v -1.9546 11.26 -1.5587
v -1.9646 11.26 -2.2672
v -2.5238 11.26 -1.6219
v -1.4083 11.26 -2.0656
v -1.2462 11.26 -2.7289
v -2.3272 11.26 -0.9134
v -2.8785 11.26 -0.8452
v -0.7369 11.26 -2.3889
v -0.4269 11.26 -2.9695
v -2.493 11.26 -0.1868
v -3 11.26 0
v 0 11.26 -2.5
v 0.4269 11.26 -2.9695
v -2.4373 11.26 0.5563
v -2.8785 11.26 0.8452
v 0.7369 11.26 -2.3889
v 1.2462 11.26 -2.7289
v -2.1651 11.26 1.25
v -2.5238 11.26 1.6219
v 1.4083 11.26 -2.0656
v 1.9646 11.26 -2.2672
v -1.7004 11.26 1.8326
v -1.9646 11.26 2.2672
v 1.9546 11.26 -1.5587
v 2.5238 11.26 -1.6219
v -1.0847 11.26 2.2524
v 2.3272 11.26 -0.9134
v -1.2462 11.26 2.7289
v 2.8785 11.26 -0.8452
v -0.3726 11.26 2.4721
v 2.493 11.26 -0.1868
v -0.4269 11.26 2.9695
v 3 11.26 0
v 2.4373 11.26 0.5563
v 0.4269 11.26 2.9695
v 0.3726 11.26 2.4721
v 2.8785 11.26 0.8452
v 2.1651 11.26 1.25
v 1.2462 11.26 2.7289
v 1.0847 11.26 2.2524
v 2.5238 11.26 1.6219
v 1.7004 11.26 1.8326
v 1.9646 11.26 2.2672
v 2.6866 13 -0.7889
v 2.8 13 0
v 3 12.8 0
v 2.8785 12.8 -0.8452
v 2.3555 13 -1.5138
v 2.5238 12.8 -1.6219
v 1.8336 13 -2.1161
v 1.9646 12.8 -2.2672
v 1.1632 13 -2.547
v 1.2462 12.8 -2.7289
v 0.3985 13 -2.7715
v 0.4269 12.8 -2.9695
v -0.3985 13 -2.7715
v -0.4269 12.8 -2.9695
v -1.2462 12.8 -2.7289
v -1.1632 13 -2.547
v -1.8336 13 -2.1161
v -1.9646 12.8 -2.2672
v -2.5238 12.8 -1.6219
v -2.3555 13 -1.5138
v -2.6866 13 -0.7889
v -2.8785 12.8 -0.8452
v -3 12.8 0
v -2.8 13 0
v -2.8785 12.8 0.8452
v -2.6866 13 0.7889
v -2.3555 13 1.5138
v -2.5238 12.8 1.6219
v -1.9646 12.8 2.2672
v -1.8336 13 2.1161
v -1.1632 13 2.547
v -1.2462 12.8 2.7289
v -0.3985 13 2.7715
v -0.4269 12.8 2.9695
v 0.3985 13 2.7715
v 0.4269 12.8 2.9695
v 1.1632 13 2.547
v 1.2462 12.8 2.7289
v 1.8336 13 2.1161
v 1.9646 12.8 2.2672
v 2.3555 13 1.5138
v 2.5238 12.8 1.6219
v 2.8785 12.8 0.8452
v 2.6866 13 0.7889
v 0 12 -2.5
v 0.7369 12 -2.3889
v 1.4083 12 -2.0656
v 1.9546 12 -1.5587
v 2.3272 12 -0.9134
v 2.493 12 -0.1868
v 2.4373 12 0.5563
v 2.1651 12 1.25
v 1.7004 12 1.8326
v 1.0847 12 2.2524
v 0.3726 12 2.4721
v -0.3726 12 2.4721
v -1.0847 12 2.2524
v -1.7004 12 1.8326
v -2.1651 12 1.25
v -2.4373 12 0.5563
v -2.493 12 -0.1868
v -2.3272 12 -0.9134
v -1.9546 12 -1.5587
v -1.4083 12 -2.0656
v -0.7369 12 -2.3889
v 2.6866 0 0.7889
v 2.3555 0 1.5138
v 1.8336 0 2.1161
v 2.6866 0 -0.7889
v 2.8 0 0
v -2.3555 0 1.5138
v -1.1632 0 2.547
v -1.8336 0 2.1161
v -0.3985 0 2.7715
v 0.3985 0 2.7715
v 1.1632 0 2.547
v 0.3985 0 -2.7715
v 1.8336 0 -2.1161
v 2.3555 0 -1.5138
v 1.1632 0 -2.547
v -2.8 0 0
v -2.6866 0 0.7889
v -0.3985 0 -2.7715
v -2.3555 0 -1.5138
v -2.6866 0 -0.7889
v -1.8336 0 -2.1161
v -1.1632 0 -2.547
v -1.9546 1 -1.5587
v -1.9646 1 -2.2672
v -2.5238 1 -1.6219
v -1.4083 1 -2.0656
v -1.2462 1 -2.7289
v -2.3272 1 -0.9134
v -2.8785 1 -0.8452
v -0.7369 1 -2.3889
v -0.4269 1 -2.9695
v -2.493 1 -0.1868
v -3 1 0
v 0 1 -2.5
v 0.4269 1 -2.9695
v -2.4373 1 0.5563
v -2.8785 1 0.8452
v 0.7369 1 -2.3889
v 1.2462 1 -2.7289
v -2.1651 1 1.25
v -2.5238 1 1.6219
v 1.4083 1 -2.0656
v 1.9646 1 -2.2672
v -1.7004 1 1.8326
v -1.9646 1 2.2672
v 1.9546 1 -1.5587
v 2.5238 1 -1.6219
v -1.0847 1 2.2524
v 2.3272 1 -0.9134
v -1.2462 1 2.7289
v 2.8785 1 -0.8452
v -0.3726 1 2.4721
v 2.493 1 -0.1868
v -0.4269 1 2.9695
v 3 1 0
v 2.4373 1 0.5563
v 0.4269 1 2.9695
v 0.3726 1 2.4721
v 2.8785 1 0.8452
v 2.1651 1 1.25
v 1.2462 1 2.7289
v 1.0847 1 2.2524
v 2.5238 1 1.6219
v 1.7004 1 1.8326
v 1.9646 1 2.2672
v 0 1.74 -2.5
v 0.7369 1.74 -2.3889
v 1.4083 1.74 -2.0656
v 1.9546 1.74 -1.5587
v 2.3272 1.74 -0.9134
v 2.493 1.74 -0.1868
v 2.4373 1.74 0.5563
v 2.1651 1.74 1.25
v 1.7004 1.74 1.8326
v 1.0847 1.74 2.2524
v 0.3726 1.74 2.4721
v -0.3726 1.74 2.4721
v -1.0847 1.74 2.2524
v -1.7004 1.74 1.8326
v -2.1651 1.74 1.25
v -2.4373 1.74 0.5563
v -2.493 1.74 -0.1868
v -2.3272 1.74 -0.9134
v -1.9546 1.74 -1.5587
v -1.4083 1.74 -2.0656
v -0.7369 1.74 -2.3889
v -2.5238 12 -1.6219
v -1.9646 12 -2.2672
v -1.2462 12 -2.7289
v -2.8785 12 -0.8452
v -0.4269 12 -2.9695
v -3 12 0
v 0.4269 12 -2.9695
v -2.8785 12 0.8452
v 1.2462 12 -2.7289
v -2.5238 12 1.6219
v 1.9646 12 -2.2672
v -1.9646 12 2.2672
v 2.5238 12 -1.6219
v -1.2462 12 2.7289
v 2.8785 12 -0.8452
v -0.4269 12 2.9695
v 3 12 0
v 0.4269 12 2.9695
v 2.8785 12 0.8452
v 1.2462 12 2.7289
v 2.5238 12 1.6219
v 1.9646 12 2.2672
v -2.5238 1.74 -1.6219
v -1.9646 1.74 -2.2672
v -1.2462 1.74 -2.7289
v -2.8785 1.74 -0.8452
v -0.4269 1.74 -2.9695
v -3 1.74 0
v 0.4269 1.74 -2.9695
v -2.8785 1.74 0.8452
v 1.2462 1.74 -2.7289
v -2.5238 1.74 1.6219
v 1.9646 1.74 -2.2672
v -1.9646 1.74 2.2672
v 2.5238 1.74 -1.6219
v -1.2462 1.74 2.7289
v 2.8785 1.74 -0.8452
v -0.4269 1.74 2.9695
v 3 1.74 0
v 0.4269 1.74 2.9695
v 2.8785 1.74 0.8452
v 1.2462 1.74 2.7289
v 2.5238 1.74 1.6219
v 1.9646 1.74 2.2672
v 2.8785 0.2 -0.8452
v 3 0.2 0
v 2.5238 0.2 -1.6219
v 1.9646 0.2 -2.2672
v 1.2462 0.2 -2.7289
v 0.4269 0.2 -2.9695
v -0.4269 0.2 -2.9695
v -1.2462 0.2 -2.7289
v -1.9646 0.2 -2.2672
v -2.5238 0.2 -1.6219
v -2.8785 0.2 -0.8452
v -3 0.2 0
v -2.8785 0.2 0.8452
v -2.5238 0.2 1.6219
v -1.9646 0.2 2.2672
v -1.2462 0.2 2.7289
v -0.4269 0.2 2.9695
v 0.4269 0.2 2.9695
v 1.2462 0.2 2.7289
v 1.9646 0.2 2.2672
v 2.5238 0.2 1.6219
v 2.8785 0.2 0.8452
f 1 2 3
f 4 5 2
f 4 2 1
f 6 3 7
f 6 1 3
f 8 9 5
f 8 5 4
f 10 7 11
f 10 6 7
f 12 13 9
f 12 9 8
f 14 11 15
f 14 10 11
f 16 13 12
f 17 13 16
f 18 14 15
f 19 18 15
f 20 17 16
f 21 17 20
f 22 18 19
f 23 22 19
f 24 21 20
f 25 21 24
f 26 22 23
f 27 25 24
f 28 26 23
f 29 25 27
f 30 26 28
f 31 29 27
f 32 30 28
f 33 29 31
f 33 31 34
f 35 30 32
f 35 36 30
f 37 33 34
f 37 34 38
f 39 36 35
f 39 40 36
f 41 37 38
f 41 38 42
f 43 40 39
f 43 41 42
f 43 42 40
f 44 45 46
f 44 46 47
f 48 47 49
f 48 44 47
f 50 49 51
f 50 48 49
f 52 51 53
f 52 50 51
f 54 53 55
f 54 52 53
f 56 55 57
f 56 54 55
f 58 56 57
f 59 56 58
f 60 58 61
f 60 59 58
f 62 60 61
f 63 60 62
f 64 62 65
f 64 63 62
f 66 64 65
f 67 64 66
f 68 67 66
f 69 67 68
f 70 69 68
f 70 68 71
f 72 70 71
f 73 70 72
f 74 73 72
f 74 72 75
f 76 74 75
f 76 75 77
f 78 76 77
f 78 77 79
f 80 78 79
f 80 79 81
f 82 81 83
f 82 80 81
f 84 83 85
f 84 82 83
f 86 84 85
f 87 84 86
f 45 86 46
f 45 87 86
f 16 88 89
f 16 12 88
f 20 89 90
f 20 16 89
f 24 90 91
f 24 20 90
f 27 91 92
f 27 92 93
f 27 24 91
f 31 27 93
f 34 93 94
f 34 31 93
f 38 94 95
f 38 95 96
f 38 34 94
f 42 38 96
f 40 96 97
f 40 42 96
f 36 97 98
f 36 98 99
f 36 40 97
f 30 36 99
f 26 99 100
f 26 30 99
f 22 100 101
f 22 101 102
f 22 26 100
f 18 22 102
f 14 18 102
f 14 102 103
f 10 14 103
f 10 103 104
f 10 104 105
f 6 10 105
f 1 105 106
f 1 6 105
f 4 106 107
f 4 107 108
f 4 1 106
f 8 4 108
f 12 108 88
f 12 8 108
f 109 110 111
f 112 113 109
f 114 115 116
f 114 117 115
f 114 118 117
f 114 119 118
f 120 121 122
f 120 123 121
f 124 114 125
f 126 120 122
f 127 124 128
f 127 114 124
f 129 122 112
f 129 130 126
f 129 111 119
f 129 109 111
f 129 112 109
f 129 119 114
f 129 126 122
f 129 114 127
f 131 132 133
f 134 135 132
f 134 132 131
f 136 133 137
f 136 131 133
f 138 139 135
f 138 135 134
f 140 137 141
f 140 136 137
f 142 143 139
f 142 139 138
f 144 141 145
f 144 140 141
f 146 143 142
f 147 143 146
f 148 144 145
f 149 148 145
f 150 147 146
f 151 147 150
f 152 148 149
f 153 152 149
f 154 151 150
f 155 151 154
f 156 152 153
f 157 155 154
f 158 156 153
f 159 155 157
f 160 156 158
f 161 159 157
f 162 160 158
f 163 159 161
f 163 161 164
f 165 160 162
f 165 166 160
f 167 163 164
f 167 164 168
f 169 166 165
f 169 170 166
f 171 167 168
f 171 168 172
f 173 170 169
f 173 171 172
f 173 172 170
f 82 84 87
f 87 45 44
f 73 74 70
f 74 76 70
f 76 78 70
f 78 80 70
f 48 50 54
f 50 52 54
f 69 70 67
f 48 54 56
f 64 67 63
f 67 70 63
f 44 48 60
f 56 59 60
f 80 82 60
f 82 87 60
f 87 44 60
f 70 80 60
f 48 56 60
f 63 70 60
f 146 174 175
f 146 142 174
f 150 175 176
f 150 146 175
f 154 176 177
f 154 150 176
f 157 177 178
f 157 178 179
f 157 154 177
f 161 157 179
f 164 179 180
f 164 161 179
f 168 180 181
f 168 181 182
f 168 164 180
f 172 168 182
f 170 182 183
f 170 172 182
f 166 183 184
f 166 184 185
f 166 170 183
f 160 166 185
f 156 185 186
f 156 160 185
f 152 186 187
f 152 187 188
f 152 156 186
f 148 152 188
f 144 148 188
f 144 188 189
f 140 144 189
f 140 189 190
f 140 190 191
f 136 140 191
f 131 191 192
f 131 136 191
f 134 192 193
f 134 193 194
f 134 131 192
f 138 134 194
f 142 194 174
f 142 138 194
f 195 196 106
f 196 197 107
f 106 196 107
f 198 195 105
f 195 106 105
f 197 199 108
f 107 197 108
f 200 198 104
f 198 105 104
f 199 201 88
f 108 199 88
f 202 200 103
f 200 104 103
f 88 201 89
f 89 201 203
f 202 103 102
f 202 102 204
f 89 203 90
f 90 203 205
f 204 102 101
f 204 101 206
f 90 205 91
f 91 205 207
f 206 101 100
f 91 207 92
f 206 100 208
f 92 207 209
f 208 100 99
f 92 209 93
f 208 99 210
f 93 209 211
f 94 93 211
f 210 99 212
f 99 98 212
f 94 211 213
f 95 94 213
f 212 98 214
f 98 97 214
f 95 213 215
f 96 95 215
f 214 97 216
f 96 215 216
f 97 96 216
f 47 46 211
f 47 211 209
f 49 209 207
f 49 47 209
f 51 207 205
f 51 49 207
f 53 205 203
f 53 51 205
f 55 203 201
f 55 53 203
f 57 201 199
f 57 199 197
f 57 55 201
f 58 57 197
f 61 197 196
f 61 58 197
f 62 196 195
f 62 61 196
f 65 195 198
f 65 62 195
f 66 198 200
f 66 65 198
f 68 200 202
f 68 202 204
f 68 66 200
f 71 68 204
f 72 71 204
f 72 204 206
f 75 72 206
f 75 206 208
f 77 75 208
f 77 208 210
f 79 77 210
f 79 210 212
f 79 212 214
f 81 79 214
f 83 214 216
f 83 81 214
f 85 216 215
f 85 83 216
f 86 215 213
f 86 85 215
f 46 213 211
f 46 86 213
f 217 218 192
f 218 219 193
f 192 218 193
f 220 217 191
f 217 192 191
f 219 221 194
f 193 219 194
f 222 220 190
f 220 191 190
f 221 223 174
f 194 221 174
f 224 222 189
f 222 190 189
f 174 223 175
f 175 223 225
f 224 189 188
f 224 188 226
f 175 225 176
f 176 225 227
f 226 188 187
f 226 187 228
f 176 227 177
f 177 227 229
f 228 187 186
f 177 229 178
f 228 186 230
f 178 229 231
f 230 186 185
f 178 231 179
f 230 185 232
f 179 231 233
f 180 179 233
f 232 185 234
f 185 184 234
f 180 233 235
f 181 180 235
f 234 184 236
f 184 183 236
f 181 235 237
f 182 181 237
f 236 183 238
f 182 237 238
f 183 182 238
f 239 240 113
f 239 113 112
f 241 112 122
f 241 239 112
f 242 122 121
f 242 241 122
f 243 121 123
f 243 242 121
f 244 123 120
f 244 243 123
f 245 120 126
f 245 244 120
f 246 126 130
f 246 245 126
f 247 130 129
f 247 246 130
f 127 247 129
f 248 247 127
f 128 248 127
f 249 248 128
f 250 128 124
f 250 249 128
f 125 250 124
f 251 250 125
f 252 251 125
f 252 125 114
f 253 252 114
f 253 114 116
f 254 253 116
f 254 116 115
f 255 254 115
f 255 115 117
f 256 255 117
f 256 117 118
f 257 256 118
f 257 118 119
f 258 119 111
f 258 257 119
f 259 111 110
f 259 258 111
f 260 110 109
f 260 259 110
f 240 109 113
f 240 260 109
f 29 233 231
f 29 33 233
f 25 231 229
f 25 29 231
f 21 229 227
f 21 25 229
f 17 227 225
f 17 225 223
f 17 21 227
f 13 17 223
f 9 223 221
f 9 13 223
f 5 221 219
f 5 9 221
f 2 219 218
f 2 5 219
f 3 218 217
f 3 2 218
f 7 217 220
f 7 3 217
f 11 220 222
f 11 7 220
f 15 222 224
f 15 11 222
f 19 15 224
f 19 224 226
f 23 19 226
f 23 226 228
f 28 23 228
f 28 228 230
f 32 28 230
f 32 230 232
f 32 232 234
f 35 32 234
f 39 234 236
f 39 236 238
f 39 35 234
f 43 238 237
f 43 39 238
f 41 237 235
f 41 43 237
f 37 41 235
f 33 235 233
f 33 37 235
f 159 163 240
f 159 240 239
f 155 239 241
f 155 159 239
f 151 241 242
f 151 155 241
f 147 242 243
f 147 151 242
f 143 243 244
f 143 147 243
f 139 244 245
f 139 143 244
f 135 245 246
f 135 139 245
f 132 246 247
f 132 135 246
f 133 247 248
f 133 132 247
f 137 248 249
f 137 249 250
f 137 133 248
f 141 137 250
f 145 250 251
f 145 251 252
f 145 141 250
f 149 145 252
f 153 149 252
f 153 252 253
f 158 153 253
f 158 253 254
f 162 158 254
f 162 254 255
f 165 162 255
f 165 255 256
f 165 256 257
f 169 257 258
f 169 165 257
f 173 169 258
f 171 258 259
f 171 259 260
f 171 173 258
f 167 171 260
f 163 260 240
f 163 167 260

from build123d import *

# Parameters (mm, degrees)
SKETCH1_W       = 3
SKETCH1_H       = 13
SKETCH5_W       = 2.05
SKETCH5_H       = 0.74
CHANFREIN1_SIZE = 0.2


with BuildPart() as part:
    # Sketch1 → Revolve1 (revolve)
    with BuildSketch(Plane.XY):
        with Locations((1.5, 6.5)):
            Rectangle(SKETCH1_W, SKETCH1_H)
    revolve(axis=Axis((0, 0, 0), (0, 1, 0)))

    # Sketch5 → Groove for DIN 471 - 4 x 0.4, Circlip for shafts - normal1 (revolve, cut)
    with BuildSketch(Plane(origin=(0, 0, 0), x_dir=(0, 0, -1), z_dir=(-1, 0, 0))):
        with Locations((3.525, -1.37)):
            Rectangle(SKETCH5_W, SKETCH5_H)
        with Locations((3.525, -11.63)):
            Rectangle(SKETCH5_W, SKETCH5_H)
    revolve(axis=Axis((0, 50.028808754, 0), (0, -1, 0)), mode=Mode.SUBTRACT)

    # Chanfrein1
    chanfrein1_edges = [part.edges().sort_by_distance(p)[0] for p in [
        (-3, 0, 0),
        (-3, 13, 0),
    ]]
    chamfer(chanfrein1_edges, length=CHANFREIN1_SIZE)


solid = part.part
